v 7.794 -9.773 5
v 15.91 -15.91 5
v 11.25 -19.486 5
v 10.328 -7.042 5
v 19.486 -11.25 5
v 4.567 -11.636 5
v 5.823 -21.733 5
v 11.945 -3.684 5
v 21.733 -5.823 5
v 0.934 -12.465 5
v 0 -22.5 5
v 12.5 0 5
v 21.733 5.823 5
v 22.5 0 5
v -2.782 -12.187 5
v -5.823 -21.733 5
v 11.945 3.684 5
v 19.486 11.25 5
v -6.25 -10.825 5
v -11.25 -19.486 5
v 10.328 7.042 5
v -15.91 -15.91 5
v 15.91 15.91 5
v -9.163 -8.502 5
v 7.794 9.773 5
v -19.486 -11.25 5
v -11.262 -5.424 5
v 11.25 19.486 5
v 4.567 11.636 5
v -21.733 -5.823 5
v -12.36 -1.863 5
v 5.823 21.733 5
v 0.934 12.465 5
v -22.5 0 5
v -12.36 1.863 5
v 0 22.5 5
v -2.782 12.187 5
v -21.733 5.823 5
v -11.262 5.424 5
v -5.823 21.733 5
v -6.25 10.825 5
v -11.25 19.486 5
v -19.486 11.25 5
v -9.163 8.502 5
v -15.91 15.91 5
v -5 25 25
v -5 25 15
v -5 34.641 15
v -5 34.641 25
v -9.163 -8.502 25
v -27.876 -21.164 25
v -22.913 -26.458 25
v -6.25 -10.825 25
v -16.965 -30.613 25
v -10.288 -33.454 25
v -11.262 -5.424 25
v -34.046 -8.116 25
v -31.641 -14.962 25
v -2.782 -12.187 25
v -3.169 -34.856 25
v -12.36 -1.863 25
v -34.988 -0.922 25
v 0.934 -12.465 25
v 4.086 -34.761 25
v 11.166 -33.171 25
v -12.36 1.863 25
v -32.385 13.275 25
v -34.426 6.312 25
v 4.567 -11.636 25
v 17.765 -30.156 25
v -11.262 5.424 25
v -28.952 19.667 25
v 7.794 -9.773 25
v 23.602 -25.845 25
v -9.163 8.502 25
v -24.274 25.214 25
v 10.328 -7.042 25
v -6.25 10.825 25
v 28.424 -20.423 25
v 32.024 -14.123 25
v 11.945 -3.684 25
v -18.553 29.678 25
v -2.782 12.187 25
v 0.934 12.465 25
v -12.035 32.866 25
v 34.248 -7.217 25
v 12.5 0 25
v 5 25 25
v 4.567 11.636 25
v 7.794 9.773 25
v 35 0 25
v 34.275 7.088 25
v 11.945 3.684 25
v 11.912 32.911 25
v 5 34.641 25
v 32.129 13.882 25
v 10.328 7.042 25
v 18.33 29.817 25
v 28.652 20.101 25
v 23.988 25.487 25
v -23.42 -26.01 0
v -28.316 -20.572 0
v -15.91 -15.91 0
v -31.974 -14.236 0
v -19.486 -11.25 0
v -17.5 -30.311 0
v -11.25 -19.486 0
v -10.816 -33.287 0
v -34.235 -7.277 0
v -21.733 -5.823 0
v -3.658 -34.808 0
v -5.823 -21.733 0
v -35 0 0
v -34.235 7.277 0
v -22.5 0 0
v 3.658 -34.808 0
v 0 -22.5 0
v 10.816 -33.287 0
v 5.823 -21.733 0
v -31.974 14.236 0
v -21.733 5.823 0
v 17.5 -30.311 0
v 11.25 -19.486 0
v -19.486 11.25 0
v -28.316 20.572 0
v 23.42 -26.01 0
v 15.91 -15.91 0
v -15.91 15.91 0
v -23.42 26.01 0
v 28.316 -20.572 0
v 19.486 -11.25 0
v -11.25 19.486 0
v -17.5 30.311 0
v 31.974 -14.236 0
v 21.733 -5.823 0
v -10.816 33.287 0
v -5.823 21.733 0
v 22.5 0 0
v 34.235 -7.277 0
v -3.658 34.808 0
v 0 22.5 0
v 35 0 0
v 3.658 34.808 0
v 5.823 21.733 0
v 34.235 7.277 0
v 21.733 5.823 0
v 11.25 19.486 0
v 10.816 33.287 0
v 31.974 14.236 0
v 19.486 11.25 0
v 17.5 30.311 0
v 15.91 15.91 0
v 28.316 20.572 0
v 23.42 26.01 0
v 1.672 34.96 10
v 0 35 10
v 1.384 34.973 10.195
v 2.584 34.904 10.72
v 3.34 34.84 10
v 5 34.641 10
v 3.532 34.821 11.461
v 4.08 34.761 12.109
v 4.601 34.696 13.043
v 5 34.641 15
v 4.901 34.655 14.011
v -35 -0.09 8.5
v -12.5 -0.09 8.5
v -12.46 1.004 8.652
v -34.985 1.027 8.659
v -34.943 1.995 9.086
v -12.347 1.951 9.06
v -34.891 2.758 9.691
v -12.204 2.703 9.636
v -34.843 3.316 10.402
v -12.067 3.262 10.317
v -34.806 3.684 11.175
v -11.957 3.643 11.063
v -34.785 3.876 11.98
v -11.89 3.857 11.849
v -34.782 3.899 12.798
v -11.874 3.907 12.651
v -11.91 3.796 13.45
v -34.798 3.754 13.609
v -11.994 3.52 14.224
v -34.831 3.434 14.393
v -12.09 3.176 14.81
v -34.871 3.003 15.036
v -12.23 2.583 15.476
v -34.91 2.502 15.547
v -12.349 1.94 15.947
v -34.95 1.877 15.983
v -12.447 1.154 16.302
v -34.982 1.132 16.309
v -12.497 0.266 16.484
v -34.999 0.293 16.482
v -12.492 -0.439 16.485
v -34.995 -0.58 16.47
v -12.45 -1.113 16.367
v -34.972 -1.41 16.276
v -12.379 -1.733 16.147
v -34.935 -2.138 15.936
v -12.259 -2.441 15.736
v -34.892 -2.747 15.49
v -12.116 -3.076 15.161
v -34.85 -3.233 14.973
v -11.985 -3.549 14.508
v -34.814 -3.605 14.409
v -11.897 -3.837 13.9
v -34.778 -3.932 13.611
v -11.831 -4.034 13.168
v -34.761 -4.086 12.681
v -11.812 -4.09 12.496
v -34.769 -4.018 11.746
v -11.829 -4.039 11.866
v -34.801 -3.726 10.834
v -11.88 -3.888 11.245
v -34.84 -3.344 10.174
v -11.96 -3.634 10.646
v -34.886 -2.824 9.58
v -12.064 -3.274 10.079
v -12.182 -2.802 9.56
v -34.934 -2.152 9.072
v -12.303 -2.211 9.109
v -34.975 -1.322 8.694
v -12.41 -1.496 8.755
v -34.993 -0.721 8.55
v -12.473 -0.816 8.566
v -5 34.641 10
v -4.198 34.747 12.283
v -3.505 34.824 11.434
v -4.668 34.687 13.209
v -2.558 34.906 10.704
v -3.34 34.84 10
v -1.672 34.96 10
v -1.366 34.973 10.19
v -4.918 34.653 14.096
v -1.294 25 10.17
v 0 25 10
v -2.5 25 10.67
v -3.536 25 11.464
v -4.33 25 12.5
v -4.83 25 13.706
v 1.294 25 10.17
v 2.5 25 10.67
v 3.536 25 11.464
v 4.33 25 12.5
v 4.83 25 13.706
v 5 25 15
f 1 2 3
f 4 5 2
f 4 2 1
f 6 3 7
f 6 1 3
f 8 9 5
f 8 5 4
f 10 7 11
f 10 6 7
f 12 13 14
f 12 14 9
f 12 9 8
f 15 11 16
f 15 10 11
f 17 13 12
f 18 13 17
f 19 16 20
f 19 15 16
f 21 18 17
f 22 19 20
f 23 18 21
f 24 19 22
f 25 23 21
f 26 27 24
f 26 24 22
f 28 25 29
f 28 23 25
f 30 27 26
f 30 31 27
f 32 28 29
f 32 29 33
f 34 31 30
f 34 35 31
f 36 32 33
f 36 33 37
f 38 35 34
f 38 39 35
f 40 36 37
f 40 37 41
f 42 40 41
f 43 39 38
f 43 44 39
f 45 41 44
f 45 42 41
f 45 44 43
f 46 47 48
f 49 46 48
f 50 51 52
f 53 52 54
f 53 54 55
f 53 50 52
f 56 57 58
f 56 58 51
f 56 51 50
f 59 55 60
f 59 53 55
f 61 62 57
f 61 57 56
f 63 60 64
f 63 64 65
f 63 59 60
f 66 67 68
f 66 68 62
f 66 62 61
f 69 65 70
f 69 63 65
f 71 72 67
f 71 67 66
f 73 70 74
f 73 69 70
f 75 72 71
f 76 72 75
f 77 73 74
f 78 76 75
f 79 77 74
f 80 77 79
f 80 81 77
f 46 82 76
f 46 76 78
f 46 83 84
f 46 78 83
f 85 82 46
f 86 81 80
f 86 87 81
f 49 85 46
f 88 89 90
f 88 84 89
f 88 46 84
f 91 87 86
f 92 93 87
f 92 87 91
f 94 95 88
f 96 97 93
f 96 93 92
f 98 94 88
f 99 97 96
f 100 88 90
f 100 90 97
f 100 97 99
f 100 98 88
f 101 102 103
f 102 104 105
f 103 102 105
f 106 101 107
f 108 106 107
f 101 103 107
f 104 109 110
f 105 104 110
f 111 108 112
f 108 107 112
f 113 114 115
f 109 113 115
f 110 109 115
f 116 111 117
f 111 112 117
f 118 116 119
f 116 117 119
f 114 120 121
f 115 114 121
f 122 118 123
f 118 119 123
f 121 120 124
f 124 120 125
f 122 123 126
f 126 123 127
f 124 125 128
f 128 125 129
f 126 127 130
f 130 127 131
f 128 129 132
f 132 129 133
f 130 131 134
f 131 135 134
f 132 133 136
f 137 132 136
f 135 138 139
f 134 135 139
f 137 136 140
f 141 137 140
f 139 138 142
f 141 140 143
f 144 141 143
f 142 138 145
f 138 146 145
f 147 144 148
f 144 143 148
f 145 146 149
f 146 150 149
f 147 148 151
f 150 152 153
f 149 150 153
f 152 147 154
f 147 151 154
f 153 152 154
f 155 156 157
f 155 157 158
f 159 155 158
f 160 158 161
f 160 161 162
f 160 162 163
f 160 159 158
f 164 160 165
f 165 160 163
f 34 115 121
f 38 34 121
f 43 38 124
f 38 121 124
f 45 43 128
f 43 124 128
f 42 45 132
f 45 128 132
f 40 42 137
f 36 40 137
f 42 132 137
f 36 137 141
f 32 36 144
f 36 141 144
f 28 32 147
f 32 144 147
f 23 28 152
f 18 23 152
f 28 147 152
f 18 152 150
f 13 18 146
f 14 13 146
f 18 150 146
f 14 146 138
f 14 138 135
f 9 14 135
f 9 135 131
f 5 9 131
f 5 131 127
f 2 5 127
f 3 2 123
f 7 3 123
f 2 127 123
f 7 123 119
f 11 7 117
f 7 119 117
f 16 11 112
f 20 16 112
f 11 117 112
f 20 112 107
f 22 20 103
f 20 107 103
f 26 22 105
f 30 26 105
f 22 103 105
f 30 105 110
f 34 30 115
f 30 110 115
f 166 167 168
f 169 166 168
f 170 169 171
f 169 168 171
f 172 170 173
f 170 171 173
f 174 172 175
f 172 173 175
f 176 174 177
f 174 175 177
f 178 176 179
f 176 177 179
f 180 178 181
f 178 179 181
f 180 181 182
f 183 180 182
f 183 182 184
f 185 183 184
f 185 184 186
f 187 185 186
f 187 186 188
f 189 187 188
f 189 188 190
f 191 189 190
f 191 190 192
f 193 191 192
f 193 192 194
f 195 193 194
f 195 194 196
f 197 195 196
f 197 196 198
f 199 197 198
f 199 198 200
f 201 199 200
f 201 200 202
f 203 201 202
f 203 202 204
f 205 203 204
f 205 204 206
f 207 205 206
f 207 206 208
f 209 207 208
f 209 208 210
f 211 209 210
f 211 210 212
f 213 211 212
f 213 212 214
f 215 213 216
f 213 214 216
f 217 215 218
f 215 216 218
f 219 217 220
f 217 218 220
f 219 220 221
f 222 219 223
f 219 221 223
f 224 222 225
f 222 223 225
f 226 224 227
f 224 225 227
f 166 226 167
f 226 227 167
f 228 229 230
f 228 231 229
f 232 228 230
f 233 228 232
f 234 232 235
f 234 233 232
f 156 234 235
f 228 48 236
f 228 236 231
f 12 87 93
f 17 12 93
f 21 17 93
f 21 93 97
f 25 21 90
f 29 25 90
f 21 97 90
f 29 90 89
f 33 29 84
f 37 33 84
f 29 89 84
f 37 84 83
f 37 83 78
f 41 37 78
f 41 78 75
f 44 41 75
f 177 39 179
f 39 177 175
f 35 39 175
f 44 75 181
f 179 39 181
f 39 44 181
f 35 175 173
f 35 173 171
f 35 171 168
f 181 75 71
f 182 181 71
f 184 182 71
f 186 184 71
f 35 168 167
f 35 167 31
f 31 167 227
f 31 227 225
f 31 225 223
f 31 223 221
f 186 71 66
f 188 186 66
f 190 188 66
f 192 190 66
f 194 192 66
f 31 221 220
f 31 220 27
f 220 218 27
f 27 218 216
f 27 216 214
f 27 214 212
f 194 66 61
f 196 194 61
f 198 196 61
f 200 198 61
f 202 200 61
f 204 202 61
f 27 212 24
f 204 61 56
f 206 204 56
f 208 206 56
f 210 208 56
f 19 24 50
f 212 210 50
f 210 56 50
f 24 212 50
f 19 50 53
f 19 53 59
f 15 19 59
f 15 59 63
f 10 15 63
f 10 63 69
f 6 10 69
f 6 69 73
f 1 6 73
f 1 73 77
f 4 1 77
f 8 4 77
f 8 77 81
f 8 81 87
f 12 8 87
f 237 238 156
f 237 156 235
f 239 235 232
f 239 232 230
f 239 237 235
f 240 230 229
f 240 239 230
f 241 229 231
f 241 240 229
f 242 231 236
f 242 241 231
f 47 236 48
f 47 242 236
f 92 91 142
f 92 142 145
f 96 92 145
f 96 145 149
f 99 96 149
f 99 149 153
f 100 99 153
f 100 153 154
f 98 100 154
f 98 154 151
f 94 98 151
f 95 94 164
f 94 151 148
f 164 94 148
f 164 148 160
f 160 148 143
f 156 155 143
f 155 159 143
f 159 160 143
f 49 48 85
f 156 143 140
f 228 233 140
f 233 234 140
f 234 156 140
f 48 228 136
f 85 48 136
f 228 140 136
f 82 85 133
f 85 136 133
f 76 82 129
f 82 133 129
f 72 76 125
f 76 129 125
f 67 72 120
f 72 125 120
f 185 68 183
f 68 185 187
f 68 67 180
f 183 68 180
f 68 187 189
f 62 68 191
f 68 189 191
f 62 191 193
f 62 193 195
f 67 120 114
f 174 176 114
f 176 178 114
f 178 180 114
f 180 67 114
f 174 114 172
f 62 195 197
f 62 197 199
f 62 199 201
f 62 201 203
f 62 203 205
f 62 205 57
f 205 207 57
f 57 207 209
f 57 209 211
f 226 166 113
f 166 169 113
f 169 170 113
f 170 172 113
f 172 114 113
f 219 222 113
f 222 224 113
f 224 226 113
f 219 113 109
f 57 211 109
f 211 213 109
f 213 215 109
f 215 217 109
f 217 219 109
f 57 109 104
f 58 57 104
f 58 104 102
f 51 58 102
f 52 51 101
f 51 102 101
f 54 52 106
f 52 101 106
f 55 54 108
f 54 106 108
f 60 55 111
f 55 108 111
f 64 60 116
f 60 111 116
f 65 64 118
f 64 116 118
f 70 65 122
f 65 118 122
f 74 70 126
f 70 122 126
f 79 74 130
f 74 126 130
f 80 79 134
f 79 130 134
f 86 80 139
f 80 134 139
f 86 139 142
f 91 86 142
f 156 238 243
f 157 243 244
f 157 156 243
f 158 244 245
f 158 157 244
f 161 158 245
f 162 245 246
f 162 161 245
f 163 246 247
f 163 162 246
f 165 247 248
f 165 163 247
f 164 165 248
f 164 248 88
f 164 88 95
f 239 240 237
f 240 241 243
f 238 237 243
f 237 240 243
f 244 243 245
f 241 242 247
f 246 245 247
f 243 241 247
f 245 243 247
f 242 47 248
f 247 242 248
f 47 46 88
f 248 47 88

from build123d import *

# Parameters (mm, degrees)
SKETCH1_R          = 35
EXTRUDE1_DEPTH     = 25
SKETCH2_R          = 12.5
CUT_EXTRUDE1_DEPTH = 56.452682532
SKETCH3_W          = 10
SKETCH3_H          = 15.734862576
CUT_EXTRUDE2_DEPTH = 15
FILLET1_R          = 5
SKETCH4_R          = 22.5
CUT_EXTRUDE4_DEPTH = 5
SKETCH5_R          = 4
SIDE_HOLE_DEPTH    = 56.452682595


with BuildPart() as part:
    # Sketch1 → Extrude1 (new body)
    with BuildSketch(Plane.XY):
        Circle(SKETCH1_R)
    extrude(amount=EXTRUDE1_DEPTH)

    # Sketch2 → Cut-Extrude1 (cut, through all)
    with BuildSketch(Plane.XY.offset(25)):
        Circle(SKETCH2_R)
    extrude(amount=-CUT_EXTRUDE1_DEPTH, mode=Mode.SUBTRACT)

    # Sketch3 → Cut-Extrude2 (cut)
    with BuildSketch(Plane.XY.offset(25)):
        with Locations((0, 32.867431288)):
            Rectangle(SKETCH3_W, SKETCH3_H)
    extrude(amount=-CUT_EXTRUDE2_DEPTH, mode=Mode.SUBTRACT)

    # Fillet1
    # the kernel refuses this fillet: 5 mm, written as the material it adds along each edge
    with BuildSketch(Plane(origin=(-5, 12.5, 10), x_dir=(0, 0, 1), z_dir=(0, 1, 0))) as fillet1_piece_1_section:
        with BuildLine():
            CenterArc((FILLET1_R, FILLET1_R), FILLET1_R, 180, 90)
            Line((0, FILLET1_R), (0, 0))
            Line((0, 0), (FILLET1_R, 0))
        make_face()
    fillet1_piece_1 = extrude(amount=34.641016151, mode=Mode.PRIVATE)
    fillet1_piece_1 = fillet1_piece_1 & Plane(origin=(0, 0, 10), x_dir=(1, 0, 0), z_dir=(0, 0, -1)) * Cylinder(35, 90, mode=Mode.PRIVATE)
    with BuildSketch(Plane(origin=(5, 47.141016151, 10), x_dir=(-1, 0, 0), z_dir=(0, -1, 0))) as fillet1_piece_2_section:
        with BuildLine():
            CenterArc((FILLET1_R, -FILLET1_R), FILLET1_R, 90, 90)
            Line((0, -FILLET1_R), (0, 0))
            Line((0, 0), (FILLET1_R, 0))
        make_face()
    fillet1_piece_2 = extrude(amount=34.641016151, mode=Mode.PRIVATE)
    fillet1_piece_2 = fillet1_piece_2 & Plane(origin=(0, 0, 10), x_dir=(1, 0, 0), z_dir=(0, 0, -1)) * Cylinder(35, 90, mode=Mode.PRIVATE)
    add([fillet1_piece_1, fillet1_piece_2])

    # Sketch4 → Cut-Extrude4 (cut)
    with BuildSketch(Plane(origin=(0, 0, 0), x_dir=(-1, 0, 0), z_dir=(0, 0, -1))):
        Circle(SKETCH4_R)
    extrude(amount=-CUT_EXTRUDE4_DEPTH, mode=Mode.SUBTRACT)

    # Sketch5 → Side hole (cut, through all)
    with BuildSketch(Plane(origin=(0, 0, 0), x_dir=(0, 0, -1), z_dir=(1, 0, 0))):
        with Locations((-12.5, -0.089745962)):
            Circle(SKETCH5_R)
    extrude(amount=-SIDE_HOLE_DEPTH, mode=Mode.SUBTRACT)


solid = part.part
